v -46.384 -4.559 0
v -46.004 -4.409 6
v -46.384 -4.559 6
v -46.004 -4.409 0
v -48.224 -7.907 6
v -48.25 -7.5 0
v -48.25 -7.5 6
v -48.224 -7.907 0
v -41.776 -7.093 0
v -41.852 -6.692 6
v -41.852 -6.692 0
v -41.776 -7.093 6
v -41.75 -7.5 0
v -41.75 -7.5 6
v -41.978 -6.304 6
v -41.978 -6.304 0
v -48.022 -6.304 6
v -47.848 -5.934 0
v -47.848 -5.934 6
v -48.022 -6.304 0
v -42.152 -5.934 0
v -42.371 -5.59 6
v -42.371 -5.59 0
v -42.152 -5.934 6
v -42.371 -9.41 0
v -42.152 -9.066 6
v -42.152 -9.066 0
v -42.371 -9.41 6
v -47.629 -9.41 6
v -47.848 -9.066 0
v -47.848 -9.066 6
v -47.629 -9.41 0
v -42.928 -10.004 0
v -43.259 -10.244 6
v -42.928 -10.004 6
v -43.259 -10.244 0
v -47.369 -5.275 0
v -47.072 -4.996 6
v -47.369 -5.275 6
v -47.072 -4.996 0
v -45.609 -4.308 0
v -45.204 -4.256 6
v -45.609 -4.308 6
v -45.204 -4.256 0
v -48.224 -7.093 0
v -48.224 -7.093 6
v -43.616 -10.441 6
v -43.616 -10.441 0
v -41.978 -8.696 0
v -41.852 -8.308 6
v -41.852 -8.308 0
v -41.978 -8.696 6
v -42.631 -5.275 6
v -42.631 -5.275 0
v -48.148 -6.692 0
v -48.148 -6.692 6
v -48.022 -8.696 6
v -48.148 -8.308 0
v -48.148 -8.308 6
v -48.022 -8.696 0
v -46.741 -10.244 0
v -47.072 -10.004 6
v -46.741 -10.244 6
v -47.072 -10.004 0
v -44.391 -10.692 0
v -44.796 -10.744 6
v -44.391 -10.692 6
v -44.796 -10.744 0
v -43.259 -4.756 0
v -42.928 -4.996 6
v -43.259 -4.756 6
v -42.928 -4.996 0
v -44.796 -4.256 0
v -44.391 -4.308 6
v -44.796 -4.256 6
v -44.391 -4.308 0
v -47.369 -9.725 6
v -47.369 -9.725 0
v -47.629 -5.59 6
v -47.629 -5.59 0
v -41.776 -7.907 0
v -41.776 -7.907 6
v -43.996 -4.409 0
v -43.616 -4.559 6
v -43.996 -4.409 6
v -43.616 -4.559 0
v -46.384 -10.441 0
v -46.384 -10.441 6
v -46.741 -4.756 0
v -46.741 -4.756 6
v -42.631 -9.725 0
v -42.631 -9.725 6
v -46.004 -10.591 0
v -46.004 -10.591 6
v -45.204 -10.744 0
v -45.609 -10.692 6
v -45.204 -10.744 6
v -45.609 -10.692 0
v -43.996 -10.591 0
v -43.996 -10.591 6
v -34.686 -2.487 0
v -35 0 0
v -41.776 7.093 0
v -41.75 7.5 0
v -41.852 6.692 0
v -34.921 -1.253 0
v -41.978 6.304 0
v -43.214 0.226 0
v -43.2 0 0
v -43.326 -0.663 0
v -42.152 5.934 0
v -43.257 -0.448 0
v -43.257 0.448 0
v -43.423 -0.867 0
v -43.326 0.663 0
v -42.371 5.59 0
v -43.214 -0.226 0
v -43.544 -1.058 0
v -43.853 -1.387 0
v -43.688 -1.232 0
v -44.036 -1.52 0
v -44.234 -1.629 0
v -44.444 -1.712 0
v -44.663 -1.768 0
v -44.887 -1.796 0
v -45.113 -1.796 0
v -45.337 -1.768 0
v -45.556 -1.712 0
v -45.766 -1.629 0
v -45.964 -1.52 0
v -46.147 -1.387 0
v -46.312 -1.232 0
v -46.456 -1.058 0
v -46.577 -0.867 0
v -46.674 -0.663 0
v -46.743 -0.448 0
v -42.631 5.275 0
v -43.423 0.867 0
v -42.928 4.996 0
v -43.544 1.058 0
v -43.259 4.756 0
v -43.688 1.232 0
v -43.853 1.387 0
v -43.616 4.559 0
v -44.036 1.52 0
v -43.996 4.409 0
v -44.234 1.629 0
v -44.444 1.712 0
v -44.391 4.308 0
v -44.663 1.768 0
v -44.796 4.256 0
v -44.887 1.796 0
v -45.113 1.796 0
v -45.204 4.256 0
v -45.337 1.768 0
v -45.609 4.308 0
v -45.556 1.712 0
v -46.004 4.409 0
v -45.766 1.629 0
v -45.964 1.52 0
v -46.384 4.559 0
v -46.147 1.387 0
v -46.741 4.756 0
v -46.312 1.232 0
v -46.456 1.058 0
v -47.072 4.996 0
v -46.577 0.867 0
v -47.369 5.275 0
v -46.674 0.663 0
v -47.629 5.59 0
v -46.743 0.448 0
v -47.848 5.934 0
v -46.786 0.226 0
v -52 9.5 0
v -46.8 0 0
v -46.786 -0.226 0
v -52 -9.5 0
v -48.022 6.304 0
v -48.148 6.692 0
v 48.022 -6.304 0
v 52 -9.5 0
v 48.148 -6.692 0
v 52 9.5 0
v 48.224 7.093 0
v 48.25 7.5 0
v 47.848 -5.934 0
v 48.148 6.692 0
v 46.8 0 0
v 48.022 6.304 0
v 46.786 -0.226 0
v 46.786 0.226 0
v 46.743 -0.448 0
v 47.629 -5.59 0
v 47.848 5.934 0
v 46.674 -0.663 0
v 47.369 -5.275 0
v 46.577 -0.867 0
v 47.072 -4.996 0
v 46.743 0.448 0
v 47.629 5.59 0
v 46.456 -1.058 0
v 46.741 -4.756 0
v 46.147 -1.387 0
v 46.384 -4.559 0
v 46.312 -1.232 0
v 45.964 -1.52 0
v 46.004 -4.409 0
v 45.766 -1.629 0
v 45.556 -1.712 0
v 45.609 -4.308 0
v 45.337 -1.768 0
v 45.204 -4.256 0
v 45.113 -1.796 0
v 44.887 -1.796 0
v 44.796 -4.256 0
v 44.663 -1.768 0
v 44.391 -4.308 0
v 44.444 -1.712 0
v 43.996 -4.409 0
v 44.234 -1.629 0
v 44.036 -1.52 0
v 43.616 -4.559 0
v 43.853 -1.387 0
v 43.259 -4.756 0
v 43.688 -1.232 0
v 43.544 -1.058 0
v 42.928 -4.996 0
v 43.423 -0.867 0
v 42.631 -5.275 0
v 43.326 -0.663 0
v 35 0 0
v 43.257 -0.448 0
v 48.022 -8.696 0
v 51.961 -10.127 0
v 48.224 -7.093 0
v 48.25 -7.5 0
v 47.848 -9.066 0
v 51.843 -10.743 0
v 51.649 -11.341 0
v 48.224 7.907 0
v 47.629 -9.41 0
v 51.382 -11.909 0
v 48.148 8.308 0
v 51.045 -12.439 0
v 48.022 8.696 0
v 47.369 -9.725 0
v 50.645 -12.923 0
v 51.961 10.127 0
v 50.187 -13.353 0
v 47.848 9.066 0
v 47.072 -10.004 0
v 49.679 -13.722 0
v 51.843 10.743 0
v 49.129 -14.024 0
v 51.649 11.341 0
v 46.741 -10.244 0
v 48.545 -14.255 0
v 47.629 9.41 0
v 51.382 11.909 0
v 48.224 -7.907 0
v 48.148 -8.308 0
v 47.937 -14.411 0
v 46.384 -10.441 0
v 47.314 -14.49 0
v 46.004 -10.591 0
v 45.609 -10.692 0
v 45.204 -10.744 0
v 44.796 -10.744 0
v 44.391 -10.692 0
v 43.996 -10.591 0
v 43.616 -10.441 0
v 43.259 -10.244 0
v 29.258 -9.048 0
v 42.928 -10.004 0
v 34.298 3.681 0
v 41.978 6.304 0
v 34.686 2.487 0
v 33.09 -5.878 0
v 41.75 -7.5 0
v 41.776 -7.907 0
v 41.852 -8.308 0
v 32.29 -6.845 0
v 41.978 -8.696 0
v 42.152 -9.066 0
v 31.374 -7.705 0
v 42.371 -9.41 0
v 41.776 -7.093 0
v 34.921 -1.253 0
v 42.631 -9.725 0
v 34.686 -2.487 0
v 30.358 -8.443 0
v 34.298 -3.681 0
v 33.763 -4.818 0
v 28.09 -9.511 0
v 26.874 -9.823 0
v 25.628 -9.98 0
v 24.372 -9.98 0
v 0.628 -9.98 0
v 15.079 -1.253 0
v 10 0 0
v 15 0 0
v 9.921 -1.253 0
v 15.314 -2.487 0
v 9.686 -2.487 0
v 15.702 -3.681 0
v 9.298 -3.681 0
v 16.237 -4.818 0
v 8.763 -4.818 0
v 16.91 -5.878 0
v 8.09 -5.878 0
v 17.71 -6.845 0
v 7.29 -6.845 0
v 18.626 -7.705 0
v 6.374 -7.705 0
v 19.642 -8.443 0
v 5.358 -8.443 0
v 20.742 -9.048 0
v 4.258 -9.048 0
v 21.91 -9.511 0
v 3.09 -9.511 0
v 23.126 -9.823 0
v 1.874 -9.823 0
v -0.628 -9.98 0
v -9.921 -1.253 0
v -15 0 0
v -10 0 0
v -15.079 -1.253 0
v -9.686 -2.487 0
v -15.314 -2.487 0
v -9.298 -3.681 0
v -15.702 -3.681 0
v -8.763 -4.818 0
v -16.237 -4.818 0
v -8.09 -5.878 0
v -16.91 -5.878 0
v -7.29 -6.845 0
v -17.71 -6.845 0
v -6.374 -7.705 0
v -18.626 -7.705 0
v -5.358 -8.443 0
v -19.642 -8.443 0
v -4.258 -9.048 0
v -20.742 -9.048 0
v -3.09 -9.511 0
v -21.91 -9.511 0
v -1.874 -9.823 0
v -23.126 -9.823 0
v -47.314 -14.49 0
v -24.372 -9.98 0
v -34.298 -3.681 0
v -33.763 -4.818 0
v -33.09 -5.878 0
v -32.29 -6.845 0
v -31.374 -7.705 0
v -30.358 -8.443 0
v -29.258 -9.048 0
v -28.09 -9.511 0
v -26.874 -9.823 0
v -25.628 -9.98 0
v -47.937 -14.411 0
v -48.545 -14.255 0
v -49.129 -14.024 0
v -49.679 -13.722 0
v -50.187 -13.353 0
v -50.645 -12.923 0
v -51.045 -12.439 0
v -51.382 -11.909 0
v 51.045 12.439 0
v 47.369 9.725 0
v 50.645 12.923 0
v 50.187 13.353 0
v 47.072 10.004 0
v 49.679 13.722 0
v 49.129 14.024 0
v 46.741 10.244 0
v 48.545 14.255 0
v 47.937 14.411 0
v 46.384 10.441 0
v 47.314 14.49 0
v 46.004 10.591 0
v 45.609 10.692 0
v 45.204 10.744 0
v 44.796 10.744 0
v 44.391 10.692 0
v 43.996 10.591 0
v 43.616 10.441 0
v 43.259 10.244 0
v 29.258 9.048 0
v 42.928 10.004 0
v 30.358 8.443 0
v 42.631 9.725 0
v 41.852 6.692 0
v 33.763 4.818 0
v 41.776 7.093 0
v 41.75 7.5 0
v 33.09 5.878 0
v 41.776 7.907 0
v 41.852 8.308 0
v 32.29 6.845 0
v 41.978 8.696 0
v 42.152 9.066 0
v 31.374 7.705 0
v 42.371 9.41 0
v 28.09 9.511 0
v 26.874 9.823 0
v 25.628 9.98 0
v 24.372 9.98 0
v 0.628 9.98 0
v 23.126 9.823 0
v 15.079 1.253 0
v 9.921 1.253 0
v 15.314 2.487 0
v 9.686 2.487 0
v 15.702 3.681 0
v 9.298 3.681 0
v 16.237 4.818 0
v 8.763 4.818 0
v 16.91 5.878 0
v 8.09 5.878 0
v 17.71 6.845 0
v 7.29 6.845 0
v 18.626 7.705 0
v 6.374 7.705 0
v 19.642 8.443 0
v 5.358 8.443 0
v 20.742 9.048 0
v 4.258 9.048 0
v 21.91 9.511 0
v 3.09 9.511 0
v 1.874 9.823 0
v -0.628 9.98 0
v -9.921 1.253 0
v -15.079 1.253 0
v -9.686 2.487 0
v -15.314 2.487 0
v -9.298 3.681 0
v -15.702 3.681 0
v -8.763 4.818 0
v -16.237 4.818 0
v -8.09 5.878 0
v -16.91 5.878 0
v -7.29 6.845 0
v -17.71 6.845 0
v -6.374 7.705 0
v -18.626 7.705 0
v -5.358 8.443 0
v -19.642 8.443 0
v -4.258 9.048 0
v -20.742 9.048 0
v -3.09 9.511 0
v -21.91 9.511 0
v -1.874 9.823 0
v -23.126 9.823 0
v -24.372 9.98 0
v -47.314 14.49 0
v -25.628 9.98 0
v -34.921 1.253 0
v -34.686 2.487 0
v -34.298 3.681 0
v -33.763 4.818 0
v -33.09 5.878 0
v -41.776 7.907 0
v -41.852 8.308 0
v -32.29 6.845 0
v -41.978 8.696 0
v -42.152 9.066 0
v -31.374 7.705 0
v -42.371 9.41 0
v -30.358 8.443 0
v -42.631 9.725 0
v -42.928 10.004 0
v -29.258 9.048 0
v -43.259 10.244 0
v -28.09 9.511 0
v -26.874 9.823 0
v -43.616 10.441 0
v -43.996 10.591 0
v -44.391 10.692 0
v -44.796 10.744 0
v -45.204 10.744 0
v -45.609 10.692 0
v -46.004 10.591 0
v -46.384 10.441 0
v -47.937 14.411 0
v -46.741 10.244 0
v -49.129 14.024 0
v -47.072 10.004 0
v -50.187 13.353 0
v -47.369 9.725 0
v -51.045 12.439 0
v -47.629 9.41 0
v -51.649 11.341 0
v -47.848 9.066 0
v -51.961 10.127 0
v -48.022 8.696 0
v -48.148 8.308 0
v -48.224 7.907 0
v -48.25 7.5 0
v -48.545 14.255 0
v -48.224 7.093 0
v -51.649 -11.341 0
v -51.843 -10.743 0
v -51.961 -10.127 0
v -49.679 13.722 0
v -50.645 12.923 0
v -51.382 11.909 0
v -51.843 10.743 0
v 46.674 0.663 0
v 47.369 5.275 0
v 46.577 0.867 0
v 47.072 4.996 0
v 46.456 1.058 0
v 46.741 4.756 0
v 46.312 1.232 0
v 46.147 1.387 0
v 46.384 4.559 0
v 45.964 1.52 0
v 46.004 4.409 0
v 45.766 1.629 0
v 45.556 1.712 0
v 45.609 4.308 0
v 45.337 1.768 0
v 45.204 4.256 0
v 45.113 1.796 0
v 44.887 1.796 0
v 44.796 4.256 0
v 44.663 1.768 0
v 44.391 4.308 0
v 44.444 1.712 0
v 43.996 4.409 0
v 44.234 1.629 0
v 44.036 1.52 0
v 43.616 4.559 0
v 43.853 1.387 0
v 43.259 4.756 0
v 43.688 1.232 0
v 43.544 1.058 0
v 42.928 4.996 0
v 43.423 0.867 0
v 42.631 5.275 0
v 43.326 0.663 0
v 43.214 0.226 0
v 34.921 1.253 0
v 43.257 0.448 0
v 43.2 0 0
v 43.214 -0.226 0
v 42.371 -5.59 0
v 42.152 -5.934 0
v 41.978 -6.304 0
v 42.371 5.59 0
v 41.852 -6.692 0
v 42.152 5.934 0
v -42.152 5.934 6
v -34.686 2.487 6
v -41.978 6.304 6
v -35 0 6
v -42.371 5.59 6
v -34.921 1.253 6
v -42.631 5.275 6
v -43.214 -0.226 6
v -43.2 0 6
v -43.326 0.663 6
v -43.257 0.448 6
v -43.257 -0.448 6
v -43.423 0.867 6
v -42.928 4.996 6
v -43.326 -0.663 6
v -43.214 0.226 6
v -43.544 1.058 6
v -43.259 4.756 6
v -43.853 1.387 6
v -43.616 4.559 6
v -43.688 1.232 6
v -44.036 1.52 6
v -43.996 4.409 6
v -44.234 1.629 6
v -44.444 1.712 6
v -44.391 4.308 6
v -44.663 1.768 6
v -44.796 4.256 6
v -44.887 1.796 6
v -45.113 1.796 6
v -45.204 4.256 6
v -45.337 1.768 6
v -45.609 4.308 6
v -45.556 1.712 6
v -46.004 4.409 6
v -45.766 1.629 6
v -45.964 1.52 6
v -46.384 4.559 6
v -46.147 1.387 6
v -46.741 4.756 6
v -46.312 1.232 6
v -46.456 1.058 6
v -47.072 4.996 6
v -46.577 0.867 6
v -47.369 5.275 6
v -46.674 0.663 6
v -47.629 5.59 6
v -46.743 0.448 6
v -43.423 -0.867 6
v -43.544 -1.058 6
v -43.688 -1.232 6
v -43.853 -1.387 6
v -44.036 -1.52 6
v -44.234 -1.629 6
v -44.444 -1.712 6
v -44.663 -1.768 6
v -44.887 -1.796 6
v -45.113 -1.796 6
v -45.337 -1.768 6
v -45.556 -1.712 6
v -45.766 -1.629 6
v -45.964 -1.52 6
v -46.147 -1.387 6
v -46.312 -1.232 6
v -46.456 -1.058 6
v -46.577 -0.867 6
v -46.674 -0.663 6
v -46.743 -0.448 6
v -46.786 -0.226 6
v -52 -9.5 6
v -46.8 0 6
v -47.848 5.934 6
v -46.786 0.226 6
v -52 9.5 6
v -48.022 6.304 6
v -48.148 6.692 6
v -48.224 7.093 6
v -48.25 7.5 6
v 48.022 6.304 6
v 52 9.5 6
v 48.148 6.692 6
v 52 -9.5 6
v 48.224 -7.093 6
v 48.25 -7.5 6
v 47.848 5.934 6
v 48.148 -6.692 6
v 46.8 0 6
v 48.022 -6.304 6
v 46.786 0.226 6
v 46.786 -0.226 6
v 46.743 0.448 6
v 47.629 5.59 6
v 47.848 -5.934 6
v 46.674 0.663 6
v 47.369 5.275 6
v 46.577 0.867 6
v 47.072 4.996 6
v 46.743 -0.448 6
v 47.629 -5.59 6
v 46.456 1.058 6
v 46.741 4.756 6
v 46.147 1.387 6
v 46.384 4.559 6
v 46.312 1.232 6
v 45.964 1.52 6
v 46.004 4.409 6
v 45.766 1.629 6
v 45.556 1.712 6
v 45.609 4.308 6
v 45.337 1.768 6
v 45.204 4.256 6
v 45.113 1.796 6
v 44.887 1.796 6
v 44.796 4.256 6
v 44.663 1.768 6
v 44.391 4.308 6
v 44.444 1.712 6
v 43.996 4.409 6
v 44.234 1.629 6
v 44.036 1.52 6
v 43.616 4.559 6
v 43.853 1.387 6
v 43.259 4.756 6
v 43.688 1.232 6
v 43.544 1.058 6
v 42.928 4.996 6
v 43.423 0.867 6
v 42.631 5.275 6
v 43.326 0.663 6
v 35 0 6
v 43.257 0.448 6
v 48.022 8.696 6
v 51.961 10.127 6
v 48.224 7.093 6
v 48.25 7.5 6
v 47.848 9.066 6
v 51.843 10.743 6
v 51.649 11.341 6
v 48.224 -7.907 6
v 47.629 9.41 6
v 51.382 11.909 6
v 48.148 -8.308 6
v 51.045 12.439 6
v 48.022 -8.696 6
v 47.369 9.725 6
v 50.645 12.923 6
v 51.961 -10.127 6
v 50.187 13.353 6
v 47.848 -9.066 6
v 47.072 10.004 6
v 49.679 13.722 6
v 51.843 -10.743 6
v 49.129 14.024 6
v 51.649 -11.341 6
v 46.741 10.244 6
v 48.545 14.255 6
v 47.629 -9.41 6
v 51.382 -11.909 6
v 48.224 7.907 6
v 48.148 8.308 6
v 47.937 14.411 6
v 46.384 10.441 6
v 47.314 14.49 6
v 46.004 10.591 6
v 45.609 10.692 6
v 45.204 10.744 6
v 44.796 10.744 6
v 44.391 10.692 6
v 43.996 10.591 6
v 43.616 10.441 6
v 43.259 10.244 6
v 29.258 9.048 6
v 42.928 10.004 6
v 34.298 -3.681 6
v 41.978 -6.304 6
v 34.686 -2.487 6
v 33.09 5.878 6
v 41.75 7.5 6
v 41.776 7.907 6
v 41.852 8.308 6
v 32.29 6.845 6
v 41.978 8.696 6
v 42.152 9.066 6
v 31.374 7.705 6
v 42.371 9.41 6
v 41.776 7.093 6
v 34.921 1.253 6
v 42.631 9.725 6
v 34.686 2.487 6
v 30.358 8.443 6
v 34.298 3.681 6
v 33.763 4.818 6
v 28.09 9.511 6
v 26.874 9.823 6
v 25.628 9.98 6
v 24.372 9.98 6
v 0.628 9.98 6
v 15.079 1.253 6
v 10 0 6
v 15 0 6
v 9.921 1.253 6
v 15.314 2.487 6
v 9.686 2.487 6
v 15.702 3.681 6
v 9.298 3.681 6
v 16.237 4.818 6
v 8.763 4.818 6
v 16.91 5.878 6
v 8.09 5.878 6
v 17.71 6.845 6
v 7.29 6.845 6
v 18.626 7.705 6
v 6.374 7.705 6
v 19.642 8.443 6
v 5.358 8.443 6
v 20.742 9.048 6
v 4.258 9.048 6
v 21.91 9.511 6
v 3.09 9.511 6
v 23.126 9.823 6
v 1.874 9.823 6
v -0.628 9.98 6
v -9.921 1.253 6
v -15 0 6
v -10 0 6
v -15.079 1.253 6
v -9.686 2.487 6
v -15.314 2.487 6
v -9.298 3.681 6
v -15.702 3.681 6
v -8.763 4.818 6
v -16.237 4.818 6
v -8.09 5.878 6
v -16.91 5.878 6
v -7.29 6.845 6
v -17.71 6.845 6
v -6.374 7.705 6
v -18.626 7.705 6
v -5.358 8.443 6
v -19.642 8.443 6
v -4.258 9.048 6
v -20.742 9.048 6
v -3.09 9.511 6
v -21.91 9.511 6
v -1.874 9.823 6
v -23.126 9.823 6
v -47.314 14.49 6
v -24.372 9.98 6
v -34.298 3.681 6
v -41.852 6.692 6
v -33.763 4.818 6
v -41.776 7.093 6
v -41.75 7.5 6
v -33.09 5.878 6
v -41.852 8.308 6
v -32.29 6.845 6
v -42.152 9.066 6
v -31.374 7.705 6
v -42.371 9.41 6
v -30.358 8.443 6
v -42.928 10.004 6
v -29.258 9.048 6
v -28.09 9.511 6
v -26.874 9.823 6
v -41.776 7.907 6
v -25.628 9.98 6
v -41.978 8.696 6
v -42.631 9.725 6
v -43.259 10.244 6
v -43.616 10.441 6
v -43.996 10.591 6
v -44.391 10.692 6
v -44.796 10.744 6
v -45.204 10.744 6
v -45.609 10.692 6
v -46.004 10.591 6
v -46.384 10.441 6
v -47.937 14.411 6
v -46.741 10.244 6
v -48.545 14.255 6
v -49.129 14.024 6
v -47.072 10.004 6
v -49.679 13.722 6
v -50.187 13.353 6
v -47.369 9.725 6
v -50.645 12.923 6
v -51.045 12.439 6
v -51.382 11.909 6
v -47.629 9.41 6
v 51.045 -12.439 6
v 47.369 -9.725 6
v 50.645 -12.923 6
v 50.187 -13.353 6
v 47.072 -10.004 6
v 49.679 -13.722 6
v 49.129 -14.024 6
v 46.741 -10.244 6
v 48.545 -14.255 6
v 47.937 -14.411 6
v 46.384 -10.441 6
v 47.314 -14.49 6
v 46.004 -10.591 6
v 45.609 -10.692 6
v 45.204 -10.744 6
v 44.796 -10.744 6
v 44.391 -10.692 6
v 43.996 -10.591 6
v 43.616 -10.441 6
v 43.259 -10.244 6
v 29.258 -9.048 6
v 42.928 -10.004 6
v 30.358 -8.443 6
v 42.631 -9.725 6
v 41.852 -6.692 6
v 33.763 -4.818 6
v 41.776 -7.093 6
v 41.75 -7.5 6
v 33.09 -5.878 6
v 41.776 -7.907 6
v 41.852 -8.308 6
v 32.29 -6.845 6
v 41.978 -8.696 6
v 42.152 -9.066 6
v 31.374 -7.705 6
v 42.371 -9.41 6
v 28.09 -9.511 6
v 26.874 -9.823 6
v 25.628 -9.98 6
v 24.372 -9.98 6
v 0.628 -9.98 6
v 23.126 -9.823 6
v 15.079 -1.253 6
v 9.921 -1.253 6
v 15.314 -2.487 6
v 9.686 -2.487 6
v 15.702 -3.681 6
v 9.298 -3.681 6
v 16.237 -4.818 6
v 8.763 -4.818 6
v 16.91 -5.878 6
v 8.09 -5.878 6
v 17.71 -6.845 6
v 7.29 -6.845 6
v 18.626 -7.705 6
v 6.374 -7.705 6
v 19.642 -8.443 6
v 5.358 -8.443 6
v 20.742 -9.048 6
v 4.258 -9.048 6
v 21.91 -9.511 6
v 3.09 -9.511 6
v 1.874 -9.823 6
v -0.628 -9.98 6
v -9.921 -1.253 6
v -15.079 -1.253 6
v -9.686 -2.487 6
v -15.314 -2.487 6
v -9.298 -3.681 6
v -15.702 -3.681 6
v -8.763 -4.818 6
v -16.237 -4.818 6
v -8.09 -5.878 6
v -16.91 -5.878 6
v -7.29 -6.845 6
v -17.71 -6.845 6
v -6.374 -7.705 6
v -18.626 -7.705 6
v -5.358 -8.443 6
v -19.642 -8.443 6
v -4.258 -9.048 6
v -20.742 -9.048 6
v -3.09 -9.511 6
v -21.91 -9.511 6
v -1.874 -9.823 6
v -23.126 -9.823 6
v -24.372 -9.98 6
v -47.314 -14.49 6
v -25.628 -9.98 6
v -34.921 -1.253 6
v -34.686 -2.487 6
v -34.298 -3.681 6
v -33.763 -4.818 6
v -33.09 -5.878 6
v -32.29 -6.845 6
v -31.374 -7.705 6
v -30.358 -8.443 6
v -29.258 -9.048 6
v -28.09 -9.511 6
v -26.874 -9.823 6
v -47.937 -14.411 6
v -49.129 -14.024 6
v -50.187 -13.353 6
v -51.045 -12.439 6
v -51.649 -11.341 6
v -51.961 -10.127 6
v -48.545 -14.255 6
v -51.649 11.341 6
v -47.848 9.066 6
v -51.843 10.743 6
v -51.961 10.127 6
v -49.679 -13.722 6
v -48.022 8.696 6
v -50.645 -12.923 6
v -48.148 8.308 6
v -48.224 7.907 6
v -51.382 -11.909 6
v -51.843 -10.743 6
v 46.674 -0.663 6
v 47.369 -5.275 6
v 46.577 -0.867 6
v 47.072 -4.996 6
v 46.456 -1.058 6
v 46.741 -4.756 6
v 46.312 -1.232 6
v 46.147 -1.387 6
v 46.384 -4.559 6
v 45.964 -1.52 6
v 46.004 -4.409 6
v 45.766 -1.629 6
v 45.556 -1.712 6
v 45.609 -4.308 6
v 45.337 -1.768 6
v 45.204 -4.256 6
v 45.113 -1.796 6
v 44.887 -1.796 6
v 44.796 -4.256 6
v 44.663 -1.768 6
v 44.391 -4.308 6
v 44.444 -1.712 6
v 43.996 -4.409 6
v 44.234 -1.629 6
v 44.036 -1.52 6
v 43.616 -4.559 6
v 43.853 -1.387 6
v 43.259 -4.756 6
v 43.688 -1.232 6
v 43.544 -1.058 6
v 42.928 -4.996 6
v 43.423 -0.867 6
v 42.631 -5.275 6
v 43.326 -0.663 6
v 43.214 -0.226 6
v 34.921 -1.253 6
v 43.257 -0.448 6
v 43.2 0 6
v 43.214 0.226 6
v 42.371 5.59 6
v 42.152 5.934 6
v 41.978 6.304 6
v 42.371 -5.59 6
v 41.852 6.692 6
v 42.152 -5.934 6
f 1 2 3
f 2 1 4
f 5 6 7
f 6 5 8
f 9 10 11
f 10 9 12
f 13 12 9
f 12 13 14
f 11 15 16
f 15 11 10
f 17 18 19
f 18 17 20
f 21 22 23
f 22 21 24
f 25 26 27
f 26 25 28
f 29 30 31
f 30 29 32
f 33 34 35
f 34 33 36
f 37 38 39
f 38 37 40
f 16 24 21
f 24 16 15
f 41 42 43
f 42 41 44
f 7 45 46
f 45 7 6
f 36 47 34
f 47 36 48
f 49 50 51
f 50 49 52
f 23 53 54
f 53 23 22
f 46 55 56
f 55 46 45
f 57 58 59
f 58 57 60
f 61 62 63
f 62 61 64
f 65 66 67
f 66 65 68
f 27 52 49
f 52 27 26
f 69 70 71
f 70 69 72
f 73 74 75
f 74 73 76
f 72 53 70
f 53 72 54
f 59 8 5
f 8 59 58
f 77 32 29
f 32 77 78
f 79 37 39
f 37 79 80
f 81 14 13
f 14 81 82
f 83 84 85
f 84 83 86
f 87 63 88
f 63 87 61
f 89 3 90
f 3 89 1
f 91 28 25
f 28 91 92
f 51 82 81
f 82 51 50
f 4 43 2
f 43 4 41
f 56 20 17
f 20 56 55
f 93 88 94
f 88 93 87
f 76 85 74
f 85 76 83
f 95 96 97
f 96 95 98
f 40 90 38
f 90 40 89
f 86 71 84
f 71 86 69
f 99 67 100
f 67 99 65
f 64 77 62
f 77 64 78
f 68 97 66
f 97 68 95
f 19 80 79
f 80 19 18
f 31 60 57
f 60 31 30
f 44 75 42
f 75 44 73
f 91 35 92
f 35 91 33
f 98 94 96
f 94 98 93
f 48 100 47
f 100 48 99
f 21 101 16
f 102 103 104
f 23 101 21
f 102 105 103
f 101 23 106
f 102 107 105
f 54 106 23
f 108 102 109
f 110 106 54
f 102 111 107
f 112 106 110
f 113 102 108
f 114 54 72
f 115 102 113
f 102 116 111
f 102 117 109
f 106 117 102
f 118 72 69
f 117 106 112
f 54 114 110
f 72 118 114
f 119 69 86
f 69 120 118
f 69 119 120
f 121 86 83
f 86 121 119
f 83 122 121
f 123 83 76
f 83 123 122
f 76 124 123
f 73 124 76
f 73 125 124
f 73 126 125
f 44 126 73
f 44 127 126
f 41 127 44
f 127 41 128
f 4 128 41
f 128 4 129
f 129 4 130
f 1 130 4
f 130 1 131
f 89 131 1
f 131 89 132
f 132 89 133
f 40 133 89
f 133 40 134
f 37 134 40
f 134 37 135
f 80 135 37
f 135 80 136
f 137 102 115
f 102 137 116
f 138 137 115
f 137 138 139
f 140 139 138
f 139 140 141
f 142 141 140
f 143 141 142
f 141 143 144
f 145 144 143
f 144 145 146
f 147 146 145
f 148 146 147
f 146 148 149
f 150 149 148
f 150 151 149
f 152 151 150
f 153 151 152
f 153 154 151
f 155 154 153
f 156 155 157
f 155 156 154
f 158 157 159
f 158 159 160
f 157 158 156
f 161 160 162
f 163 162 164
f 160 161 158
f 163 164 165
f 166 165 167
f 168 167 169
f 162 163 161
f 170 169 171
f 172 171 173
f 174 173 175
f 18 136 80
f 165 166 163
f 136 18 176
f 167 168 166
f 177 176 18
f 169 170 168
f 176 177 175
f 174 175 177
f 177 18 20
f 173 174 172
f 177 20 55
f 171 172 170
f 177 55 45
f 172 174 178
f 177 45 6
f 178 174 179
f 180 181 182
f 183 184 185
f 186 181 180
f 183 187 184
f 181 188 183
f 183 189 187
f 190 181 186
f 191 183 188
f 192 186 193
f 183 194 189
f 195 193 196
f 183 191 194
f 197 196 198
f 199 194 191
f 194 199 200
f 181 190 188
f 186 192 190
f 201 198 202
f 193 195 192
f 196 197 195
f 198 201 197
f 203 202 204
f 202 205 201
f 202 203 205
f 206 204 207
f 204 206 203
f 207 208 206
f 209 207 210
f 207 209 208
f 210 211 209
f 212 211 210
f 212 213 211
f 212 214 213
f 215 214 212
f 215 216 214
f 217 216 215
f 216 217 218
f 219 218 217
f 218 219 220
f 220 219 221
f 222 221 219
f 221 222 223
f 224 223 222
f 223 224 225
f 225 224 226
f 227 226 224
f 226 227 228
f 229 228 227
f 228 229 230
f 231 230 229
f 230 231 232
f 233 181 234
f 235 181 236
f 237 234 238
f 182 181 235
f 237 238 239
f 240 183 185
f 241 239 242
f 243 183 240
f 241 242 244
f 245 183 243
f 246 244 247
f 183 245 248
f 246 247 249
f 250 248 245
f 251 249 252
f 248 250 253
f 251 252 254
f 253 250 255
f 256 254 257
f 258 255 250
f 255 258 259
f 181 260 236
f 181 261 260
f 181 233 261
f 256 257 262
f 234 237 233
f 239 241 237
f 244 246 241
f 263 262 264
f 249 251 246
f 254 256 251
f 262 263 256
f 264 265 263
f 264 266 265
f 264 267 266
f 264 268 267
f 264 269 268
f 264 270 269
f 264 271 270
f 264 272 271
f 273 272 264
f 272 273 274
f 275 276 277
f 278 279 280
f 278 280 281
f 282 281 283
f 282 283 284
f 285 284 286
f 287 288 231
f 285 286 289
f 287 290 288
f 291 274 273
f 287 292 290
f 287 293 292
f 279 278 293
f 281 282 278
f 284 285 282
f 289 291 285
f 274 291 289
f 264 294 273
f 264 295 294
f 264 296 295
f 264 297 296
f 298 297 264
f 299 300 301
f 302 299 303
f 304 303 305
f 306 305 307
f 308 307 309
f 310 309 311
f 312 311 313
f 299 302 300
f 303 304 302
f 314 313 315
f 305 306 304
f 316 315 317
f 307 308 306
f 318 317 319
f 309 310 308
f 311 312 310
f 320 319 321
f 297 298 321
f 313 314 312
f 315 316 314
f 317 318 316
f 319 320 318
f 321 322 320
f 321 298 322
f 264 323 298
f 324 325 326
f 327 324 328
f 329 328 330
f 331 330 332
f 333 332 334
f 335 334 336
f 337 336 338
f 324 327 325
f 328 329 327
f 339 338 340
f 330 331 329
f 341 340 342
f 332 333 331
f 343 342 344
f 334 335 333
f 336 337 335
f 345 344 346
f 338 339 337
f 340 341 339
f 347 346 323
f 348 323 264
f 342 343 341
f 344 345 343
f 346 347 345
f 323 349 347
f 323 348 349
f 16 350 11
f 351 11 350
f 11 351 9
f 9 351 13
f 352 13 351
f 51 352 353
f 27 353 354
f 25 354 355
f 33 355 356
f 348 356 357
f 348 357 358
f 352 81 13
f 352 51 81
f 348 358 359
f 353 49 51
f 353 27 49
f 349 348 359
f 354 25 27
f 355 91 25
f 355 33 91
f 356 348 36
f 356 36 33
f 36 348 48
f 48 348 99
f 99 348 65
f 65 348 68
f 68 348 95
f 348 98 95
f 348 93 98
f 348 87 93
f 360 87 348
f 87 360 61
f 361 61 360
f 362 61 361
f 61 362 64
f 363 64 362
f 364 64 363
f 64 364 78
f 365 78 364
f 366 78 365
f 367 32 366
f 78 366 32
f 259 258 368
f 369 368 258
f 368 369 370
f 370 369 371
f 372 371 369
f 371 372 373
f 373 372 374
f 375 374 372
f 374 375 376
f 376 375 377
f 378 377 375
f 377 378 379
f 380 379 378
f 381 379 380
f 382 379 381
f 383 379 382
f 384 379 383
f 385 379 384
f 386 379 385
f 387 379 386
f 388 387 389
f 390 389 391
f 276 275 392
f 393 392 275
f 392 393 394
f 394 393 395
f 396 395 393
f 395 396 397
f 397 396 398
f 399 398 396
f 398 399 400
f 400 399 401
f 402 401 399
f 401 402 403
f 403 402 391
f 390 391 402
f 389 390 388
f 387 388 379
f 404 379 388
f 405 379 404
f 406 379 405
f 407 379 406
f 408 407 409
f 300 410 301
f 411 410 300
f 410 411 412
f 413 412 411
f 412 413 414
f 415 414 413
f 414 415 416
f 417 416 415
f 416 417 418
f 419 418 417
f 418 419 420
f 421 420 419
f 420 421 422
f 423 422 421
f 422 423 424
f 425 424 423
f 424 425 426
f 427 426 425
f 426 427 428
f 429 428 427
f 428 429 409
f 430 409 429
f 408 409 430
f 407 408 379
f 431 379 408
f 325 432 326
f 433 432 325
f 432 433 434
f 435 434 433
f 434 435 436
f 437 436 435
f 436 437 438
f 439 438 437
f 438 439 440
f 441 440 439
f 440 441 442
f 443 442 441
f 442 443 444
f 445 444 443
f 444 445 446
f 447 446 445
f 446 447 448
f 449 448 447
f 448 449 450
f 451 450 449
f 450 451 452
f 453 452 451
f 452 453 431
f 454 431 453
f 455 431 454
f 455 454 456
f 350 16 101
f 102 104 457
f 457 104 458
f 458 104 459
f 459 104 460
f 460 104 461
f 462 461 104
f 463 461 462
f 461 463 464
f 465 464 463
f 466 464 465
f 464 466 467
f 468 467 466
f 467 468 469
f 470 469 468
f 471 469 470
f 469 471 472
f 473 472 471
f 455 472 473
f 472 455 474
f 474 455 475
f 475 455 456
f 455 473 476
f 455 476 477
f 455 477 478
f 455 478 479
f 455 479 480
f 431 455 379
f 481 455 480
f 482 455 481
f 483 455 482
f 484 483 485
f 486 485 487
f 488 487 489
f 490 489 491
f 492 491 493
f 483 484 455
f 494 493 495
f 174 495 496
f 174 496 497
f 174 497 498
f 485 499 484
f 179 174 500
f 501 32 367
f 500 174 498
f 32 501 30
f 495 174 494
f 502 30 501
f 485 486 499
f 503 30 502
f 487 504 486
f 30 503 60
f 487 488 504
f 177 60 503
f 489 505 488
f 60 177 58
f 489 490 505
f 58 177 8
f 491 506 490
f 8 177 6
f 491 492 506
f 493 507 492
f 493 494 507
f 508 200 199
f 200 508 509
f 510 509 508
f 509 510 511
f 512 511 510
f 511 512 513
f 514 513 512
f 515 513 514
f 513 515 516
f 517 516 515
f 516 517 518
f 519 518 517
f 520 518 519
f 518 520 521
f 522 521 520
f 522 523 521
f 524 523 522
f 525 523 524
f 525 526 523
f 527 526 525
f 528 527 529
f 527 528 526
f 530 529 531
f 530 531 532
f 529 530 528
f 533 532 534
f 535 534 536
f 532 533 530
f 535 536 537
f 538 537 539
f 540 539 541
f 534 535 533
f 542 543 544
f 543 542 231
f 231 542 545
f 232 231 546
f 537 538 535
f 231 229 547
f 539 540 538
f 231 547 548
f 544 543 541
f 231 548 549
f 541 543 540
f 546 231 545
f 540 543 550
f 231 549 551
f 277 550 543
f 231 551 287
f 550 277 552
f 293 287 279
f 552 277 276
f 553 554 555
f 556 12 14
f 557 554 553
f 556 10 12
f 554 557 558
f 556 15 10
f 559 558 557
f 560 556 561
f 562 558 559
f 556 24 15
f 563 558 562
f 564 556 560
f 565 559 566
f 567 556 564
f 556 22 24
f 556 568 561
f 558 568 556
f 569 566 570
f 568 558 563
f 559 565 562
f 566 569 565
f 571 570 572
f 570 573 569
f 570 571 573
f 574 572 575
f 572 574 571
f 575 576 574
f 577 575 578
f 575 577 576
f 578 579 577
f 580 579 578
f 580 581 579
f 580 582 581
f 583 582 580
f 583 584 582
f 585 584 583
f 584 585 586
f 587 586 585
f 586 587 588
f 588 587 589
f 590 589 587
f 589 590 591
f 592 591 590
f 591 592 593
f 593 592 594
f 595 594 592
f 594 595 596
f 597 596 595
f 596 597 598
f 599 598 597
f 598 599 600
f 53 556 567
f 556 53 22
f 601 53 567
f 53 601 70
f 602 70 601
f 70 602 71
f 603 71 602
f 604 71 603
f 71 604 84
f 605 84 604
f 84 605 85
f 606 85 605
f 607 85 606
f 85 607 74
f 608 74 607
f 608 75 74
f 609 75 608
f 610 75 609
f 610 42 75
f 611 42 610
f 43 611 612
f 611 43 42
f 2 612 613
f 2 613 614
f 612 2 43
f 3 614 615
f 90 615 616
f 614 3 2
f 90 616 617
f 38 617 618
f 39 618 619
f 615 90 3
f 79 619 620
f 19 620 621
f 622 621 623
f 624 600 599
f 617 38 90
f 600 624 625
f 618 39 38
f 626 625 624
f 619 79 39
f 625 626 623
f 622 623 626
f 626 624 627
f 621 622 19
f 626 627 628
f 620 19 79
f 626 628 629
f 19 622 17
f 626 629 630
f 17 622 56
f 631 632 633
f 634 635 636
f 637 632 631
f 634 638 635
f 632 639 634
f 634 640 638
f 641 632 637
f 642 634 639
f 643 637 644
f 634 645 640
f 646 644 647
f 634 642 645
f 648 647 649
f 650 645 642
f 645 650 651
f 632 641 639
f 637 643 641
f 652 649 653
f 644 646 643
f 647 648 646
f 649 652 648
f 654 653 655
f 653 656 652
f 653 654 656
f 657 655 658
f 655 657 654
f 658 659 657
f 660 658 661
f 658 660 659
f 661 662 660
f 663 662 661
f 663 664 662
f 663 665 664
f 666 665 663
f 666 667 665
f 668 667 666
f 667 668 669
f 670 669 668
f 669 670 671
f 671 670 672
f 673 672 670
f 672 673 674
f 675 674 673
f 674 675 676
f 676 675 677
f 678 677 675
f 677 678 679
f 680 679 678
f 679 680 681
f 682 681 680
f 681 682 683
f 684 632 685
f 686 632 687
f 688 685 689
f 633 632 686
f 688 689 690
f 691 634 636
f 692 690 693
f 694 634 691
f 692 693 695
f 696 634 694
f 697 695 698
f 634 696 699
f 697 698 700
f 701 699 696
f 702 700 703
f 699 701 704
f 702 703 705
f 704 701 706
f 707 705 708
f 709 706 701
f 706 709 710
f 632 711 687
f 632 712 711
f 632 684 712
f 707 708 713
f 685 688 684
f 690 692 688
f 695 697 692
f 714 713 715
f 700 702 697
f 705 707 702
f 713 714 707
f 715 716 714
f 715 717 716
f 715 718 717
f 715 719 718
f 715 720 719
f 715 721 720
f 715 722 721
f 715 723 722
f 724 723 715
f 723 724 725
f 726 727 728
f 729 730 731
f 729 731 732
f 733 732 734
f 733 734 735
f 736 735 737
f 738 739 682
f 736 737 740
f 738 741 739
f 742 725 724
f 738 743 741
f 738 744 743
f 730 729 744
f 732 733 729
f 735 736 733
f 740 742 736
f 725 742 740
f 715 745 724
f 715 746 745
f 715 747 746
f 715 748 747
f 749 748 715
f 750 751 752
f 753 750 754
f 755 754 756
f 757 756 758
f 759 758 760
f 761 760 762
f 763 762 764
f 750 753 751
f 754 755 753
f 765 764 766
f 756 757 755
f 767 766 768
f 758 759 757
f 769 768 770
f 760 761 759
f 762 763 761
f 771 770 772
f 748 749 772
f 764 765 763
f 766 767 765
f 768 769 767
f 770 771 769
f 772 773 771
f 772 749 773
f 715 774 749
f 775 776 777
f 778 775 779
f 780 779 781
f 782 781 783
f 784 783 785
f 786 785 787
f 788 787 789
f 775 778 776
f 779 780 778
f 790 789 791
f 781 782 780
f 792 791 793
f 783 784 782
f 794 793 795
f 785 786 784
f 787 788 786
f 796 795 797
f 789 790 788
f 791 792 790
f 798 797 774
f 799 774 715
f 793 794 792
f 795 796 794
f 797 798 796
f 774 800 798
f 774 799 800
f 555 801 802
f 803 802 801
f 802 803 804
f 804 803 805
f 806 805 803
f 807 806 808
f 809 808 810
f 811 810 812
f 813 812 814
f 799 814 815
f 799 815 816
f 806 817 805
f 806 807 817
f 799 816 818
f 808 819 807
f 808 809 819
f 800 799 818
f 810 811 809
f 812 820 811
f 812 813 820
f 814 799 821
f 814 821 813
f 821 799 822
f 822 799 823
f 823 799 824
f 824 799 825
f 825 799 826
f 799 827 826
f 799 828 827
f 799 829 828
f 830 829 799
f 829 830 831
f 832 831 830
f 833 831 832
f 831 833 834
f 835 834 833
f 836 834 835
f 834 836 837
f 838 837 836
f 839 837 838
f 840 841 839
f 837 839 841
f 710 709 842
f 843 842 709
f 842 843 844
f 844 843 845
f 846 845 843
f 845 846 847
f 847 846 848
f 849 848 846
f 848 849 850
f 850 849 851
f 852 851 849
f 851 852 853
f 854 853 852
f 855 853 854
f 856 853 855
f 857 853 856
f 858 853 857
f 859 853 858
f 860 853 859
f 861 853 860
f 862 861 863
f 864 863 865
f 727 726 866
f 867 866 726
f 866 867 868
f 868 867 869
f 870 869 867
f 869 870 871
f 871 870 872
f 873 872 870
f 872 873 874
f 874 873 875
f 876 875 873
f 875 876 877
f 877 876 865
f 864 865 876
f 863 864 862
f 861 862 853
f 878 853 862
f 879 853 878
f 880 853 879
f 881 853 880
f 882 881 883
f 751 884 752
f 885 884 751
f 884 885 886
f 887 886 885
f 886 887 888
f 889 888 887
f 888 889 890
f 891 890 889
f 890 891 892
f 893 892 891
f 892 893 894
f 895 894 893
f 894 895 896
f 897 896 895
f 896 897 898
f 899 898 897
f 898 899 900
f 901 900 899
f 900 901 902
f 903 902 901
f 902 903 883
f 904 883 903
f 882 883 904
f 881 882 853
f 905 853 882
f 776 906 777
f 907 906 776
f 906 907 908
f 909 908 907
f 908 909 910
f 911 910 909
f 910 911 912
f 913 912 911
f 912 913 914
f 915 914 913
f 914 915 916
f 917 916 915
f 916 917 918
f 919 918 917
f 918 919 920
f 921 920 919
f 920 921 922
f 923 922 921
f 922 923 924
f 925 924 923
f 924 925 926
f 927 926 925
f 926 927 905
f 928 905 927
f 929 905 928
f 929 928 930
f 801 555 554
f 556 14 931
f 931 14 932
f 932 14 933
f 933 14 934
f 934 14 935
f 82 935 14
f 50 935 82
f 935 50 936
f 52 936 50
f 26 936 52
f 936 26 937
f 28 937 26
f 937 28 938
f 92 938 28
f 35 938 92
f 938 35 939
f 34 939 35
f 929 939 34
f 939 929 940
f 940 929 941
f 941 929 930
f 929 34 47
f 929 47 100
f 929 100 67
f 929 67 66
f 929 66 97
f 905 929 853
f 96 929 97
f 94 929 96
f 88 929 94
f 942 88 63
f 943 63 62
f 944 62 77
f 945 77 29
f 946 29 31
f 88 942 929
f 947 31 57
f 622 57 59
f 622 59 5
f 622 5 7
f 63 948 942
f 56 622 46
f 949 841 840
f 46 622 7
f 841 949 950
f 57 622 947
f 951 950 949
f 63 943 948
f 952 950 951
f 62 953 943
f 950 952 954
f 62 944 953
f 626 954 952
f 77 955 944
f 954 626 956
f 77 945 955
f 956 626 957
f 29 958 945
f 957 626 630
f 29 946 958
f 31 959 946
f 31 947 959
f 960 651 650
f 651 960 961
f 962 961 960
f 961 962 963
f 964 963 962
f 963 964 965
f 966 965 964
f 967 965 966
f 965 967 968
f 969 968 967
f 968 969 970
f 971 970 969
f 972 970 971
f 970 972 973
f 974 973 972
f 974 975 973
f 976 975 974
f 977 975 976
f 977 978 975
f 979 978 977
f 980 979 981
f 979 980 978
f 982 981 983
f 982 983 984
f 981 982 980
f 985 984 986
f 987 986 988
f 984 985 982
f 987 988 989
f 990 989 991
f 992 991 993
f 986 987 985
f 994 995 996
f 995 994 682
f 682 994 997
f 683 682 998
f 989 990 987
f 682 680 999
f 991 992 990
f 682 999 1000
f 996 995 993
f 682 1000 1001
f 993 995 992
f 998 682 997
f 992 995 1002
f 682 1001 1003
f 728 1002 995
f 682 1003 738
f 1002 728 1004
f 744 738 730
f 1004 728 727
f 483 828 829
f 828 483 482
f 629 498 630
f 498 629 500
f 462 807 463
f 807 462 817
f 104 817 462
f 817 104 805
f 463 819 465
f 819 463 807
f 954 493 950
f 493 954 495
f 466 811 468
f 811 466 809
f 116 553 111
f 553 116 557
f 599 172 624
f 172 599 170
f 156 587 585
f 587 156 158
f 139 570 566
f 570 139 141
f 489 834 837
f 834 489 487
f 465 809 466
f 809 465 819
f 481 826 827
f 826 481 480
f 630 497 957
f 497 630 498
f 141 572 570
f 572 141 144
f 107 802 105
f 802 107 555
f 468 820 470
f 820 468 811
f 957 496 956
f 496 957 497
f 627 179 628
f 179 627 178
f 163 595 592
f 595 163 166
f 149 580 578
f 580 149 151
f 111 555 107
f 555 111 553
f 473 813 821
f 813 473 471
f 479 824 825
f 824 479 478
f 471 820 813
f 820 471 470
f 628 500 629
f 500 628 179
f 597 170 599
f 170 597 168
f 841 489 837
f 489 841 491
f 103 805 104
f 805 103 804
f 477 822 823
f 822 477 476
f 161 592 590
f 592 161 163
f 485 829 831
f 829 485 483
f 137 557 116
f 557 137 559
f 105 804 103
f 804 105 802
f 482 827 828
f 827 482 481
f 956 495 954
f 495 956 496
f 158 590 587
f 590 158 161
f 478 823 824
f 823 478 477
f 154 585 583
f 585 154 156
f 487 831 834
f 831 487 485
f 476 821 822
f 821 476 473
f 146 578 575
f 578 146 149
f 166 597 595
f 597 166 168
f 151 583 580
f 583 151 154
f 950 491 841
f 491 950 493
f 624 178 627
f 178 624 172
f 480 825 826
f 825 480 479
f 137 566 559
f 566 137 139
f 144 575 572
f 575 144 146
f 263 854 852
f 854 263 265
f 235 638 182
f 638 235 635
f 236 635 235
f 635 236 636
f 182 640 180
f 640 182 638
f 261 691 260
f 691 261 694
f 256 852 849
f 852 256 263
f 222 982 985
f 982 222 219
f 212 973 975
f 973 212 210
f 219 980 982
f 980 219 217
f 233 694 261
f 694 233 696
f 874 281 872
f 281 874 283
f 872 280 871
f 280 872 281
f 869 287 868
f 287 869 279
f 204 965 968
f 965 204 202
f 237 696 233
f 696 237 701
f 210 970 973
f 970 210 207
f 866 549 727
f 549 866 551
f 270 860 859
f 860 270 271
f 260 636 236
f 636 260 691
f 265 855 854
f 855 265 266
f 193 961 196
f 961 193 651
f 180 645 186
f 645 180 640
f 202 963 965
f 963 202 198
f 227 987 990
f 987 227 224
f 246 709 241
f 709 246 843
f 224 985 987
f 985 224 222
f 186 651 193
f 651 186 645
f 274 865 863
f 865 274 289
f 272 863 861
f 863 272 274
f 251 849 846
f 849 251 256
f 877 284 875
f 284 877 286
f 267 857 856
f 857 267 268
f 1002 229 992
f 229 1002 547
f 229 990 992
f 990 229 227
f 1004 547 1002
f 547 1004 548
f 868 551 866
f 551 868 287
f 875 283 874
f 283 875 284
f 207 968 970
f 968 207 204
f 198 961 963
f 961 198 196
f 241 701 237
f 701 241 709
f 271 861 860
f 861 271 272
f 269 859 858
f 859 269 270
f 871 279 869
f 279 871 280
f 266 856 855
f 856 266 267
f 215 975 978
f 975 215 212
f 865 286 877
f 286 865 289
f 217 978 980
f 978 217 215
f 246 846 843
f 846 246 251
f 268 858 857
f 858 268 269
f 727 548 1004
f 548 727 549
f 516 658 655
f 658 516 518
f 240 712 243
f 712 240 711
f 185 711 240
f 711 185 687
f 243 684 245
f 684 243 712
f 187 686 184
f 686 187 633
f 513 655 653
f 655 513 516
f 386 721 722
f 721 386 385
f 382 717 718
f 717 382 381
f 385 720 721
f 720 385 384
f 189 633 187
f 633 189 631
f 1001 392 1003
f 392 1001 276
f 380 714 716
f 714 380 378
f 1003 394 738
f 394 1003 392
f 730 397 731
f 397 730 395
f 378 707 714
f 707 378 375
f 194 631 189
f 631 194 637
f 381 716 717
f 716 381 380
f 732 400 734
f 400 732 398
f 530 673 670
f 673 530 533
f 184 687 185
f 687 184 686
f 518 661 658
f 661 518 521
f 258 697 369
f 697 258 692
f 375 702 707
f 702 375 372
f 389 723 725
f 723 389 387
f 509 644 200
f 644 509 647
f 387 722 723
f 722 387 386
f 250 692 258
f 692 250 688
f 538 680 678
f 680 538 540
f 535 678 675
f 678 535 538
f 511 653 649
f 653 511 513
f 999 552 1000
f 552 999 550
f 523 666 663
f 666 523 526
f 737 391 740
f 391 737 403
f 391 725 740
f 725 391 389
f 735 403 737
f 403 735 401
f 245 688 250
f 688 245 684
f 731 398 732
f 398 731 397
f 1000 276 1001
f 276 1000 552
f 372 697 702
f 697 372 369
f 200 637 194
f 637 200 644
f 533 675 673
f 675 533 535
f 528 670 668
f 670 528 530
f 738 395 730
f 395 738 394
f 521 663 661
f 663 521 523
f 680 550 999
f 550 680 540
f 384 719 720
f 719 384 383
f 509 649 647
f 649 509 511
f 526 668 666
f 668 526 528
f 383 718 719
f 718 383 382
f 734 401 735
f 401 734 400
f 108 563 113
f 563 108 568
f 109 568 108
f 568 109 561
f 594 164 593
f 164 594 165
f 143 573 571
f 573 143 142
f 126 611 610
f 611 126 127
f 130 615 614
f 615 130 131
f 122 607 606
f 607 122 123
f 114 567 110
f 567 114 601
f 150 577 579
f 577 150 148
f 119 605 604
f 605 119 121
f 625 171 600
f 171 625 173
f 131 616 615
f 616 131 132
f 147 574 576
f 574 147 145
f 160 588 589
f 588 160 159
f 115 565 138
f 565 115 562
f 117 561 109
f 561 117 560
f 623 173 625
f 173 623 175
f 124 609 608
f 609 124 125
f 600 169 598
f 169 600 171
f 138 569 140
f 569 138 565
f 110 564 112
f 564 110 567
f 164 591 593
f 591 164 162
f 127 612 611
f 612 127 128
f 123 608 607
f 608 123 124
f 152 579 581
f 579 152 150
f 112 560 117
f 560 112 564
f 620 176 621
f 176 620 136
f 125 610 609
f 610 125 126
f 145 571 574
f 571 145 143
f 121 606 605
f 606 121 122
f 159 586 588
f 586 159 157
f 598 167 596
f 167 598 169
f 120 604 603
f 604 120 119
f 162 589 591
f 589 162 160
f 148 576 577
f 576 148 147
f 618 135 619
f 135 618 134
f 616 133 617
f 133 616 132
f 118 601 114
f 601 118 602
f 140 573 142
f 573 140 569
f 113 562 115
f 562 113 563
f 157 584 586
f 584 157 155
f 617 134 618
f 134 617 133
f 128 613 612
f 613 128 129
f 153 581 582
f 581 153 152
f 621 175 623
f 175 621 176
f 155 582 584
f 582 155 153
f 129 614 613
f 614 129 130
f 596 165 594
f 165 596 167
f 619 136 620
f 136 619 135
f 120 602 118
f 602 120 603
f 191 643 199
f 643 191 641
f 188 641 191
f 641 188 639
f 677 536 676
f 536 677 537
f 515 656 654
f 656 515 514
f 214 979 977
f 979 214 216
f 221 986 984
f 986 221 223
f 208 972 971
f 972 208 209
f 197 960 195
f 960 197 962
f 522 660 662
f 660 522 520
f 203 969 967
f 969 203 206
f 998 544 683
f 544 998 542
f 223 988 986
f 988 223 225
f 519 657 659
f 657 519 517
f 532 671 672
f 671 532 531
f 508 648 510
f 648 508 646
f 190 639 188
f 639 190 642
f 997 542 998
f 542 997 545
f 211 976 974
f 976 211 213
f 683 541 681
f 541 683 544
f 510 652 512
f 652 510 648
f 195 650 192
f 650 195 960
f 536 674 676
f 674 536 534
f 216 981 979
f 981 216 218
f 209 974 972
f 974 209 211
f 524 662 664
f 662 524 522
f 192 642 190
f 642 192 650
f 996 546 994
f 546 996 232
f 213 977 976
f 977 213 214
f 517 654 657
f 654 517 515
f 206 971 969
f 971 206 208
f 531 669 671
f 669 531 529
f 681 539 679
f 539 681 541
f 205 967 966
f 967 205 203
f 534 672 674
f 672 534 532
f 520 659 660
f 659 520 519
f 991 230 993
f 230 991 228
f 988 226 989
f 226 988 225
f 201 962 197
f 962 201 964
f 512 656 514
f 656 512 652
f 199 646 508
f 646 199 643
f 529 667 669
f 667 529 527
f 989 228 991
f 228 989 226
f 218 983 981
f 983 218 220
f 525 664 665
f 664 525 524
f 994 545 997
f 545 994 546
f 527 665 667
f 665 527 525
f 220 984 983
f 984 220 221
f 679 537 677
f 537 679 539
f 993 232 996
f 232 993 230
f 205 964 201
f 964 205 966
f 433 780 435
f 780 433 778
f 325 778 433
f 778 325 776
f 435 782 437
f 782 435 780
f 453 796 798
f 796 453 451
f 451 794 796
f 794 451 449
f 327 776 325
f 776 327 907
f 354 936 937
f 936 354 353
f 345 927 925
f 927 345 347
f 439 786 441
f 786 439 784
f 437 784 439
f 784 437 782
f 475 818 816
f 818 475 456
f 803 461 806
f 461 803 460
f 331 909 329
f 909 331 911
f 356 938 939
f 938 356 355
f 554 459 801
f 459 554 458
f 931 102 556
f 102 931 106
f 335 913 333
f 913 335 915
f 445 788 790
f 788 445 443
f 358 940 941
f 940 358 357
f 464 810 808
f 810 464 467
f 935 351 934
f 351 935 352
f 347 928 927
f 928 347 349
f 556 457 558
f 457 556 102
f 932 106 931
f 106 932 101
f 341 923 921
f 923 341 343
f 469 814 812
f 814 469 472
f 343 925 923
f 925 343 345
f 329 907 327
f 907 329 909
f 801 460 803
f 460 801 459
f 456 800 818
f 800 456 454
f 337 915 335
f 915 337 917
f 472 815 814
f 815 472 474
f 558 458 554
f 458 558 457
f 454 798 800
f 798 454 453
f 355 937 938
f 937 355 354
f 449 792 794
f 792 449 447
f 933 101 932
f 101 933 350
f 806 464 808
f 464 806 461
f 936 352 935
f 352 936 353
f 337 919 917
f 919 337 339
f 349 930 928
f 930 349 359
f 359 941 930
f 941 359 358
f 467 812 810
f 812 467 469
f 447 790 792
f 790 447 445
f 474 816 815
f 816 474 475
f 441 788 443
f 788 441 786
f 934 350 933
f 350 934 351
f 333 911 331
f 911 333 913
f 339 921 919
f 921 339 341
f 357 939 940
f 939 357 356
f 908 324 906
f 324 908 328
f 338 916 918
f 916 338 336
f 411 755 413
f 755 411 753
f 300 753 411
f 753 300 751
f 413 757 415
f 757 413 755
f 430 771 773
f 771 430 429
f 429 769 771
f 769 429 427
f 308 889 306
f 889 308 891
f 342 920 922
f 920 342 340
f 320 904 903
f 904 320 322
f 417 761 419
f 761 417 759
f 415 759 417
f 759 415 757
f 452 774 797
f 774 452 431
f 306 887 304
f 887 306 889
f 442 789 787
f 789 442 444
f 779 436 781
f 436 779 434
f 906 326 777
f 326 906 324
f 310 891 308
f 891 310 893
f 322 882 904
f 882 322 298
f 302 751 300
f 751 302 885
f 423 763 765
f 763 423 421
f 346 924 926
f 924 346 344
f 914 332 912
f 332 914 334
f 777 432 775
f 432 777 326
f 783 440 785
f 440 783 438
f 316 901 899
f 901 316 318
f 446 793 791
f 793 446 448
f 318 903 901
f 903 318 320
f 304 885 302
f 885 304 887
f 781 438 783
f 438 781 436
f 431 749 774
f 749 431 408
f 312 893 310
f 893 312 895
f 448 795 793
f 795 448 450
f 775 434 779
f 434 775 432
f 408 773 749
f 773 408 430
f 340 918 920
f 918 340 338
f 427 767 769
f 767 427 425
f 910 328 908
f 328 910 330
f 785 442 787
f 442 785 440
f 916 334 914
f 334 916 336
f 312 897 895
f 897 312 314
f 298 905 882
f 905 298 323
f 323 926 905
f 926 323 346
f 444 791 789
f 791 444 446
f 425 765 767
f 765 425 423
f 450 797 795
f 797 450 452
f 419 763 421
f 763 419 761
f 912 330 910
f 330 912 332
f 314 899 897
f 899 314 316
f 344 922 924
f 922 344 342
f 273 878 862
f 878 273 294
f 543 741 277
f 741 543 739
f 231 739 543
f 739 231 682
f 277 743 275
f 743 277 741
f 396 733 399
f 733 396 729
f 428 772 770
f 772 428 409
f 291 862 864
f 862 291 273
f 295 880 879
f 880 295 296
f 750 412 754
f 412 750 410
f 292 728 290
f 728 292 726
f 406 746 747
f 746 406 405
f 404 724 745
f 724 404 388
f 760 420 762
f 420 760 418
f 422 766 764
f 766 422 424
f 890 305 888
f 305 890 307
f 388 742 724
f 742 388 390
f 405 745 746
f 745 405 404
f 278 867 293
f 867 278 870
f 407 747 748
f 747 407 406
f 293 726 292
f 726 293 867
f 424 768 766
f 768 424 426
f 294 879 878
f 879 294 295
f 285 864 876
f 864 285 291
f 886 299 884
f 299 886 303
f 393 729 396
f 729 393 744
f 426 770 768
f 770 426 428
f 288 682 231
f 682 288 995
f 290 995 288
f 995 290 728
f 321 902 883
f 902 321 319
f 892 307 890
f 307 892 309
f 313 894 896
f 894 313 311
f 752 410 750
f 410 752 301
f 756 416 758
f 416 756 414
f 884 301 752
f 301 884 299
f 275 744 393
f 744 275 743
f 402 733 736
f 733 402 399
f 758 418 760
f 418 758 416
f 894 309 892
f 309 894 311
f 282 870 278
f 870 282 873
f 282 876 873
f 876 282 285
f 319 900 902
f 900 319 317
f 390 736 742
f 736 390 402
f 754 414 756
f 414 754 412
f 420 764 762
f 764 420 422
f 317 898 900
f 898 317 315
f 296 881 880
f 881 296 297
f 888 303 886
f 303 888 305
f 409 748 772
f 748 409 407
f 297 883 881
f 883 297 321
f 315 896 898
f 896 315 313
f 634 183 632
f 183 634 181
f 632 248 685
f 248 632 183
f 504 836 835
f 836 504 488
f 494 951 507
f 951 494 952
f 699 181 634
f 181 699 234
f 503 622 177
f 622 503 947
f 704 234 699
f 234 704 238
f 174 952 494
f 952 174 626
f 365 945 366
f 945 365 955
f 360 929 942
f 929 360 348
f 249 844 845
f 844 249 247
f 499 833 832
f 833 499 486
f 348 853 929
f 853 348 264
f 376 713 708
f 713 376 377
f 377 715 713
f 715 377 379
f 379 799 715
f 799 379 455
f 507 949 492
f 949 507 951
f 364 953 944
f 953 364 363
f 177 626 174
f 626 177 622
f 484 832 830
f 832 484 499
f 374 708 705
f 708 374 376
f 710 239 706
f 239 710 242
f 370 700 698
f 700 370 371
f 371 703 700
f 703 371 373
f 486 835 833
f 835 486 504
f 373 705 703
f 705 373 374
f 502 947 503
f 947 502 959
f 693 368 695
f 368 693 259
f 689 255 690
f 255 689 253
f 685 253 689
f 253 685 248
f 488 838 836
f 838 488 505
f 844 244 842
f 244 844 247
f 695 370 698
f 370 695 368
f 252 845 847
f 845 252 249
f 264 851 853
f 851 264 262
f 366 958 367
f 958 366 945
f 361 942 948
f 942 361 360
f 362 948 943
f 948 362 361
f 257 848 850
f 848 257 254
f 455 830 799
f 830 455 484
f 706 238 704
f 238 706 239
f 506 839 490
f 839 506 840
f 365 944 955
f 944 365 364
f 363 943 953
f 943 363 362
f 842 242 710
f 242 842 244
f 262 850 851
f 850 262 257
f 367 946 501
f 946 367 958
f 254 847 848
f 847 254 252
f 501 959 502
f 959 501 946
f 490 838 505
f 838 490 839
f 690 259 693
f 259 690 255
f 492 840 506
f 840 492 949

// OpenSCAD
$fn = 50;

difference() {
	union() {
		hull() {
			translate(v = [-47.0, 9.5, 0]) {
				cylinder(h = 6, r = 5);
			}
			translate(v = [47.0, 9.5, 0]) {
				cylinder(h = 6, r = 5);
			}
			translate(v = [-47.0, -9.5, 0]) {
				cylinder(h = 6, r = 5);
			}
			translate(v = [47.0, -9.5, 0]) {
				cylinder(h = 6, r = 5);
			}
		}
	}
	union() {
		translate(v = [-45.0, -7.5, 0]) {
			cylinder(h = 6, r = 3.25);
		}
		translate(v = [-45.0, 7.5, 0]) {
			cylinder(h = 6, r = 3.25);
		}
		translate(v = [45.0, -7.5, 0]) {
			cylinder(h = 6, r = 3.25);
		}
		translate(v = [45.0, 7.5, 0]) {
			cylinder(h = 6, r = 3.25);
		}
		translate(v = [-45.0, 0.0, 0]) {
			cylinder(h = 6, r = 1.8);
		}
		translate(v = [45.0, 0.0, 0]) {
			cylinder(h = 6, r = 1.8);
		}
		translate(v = [-25.0, 0, 0.0]) {
			cylinder(h = 6, r = 10.0);
		}
		cylinder(h = 6, r = 10.0);
		translate(v = [25.0, 0, 0.0]) {
			cylinder(h = 6, r = 10.0);
		}
	}
}
